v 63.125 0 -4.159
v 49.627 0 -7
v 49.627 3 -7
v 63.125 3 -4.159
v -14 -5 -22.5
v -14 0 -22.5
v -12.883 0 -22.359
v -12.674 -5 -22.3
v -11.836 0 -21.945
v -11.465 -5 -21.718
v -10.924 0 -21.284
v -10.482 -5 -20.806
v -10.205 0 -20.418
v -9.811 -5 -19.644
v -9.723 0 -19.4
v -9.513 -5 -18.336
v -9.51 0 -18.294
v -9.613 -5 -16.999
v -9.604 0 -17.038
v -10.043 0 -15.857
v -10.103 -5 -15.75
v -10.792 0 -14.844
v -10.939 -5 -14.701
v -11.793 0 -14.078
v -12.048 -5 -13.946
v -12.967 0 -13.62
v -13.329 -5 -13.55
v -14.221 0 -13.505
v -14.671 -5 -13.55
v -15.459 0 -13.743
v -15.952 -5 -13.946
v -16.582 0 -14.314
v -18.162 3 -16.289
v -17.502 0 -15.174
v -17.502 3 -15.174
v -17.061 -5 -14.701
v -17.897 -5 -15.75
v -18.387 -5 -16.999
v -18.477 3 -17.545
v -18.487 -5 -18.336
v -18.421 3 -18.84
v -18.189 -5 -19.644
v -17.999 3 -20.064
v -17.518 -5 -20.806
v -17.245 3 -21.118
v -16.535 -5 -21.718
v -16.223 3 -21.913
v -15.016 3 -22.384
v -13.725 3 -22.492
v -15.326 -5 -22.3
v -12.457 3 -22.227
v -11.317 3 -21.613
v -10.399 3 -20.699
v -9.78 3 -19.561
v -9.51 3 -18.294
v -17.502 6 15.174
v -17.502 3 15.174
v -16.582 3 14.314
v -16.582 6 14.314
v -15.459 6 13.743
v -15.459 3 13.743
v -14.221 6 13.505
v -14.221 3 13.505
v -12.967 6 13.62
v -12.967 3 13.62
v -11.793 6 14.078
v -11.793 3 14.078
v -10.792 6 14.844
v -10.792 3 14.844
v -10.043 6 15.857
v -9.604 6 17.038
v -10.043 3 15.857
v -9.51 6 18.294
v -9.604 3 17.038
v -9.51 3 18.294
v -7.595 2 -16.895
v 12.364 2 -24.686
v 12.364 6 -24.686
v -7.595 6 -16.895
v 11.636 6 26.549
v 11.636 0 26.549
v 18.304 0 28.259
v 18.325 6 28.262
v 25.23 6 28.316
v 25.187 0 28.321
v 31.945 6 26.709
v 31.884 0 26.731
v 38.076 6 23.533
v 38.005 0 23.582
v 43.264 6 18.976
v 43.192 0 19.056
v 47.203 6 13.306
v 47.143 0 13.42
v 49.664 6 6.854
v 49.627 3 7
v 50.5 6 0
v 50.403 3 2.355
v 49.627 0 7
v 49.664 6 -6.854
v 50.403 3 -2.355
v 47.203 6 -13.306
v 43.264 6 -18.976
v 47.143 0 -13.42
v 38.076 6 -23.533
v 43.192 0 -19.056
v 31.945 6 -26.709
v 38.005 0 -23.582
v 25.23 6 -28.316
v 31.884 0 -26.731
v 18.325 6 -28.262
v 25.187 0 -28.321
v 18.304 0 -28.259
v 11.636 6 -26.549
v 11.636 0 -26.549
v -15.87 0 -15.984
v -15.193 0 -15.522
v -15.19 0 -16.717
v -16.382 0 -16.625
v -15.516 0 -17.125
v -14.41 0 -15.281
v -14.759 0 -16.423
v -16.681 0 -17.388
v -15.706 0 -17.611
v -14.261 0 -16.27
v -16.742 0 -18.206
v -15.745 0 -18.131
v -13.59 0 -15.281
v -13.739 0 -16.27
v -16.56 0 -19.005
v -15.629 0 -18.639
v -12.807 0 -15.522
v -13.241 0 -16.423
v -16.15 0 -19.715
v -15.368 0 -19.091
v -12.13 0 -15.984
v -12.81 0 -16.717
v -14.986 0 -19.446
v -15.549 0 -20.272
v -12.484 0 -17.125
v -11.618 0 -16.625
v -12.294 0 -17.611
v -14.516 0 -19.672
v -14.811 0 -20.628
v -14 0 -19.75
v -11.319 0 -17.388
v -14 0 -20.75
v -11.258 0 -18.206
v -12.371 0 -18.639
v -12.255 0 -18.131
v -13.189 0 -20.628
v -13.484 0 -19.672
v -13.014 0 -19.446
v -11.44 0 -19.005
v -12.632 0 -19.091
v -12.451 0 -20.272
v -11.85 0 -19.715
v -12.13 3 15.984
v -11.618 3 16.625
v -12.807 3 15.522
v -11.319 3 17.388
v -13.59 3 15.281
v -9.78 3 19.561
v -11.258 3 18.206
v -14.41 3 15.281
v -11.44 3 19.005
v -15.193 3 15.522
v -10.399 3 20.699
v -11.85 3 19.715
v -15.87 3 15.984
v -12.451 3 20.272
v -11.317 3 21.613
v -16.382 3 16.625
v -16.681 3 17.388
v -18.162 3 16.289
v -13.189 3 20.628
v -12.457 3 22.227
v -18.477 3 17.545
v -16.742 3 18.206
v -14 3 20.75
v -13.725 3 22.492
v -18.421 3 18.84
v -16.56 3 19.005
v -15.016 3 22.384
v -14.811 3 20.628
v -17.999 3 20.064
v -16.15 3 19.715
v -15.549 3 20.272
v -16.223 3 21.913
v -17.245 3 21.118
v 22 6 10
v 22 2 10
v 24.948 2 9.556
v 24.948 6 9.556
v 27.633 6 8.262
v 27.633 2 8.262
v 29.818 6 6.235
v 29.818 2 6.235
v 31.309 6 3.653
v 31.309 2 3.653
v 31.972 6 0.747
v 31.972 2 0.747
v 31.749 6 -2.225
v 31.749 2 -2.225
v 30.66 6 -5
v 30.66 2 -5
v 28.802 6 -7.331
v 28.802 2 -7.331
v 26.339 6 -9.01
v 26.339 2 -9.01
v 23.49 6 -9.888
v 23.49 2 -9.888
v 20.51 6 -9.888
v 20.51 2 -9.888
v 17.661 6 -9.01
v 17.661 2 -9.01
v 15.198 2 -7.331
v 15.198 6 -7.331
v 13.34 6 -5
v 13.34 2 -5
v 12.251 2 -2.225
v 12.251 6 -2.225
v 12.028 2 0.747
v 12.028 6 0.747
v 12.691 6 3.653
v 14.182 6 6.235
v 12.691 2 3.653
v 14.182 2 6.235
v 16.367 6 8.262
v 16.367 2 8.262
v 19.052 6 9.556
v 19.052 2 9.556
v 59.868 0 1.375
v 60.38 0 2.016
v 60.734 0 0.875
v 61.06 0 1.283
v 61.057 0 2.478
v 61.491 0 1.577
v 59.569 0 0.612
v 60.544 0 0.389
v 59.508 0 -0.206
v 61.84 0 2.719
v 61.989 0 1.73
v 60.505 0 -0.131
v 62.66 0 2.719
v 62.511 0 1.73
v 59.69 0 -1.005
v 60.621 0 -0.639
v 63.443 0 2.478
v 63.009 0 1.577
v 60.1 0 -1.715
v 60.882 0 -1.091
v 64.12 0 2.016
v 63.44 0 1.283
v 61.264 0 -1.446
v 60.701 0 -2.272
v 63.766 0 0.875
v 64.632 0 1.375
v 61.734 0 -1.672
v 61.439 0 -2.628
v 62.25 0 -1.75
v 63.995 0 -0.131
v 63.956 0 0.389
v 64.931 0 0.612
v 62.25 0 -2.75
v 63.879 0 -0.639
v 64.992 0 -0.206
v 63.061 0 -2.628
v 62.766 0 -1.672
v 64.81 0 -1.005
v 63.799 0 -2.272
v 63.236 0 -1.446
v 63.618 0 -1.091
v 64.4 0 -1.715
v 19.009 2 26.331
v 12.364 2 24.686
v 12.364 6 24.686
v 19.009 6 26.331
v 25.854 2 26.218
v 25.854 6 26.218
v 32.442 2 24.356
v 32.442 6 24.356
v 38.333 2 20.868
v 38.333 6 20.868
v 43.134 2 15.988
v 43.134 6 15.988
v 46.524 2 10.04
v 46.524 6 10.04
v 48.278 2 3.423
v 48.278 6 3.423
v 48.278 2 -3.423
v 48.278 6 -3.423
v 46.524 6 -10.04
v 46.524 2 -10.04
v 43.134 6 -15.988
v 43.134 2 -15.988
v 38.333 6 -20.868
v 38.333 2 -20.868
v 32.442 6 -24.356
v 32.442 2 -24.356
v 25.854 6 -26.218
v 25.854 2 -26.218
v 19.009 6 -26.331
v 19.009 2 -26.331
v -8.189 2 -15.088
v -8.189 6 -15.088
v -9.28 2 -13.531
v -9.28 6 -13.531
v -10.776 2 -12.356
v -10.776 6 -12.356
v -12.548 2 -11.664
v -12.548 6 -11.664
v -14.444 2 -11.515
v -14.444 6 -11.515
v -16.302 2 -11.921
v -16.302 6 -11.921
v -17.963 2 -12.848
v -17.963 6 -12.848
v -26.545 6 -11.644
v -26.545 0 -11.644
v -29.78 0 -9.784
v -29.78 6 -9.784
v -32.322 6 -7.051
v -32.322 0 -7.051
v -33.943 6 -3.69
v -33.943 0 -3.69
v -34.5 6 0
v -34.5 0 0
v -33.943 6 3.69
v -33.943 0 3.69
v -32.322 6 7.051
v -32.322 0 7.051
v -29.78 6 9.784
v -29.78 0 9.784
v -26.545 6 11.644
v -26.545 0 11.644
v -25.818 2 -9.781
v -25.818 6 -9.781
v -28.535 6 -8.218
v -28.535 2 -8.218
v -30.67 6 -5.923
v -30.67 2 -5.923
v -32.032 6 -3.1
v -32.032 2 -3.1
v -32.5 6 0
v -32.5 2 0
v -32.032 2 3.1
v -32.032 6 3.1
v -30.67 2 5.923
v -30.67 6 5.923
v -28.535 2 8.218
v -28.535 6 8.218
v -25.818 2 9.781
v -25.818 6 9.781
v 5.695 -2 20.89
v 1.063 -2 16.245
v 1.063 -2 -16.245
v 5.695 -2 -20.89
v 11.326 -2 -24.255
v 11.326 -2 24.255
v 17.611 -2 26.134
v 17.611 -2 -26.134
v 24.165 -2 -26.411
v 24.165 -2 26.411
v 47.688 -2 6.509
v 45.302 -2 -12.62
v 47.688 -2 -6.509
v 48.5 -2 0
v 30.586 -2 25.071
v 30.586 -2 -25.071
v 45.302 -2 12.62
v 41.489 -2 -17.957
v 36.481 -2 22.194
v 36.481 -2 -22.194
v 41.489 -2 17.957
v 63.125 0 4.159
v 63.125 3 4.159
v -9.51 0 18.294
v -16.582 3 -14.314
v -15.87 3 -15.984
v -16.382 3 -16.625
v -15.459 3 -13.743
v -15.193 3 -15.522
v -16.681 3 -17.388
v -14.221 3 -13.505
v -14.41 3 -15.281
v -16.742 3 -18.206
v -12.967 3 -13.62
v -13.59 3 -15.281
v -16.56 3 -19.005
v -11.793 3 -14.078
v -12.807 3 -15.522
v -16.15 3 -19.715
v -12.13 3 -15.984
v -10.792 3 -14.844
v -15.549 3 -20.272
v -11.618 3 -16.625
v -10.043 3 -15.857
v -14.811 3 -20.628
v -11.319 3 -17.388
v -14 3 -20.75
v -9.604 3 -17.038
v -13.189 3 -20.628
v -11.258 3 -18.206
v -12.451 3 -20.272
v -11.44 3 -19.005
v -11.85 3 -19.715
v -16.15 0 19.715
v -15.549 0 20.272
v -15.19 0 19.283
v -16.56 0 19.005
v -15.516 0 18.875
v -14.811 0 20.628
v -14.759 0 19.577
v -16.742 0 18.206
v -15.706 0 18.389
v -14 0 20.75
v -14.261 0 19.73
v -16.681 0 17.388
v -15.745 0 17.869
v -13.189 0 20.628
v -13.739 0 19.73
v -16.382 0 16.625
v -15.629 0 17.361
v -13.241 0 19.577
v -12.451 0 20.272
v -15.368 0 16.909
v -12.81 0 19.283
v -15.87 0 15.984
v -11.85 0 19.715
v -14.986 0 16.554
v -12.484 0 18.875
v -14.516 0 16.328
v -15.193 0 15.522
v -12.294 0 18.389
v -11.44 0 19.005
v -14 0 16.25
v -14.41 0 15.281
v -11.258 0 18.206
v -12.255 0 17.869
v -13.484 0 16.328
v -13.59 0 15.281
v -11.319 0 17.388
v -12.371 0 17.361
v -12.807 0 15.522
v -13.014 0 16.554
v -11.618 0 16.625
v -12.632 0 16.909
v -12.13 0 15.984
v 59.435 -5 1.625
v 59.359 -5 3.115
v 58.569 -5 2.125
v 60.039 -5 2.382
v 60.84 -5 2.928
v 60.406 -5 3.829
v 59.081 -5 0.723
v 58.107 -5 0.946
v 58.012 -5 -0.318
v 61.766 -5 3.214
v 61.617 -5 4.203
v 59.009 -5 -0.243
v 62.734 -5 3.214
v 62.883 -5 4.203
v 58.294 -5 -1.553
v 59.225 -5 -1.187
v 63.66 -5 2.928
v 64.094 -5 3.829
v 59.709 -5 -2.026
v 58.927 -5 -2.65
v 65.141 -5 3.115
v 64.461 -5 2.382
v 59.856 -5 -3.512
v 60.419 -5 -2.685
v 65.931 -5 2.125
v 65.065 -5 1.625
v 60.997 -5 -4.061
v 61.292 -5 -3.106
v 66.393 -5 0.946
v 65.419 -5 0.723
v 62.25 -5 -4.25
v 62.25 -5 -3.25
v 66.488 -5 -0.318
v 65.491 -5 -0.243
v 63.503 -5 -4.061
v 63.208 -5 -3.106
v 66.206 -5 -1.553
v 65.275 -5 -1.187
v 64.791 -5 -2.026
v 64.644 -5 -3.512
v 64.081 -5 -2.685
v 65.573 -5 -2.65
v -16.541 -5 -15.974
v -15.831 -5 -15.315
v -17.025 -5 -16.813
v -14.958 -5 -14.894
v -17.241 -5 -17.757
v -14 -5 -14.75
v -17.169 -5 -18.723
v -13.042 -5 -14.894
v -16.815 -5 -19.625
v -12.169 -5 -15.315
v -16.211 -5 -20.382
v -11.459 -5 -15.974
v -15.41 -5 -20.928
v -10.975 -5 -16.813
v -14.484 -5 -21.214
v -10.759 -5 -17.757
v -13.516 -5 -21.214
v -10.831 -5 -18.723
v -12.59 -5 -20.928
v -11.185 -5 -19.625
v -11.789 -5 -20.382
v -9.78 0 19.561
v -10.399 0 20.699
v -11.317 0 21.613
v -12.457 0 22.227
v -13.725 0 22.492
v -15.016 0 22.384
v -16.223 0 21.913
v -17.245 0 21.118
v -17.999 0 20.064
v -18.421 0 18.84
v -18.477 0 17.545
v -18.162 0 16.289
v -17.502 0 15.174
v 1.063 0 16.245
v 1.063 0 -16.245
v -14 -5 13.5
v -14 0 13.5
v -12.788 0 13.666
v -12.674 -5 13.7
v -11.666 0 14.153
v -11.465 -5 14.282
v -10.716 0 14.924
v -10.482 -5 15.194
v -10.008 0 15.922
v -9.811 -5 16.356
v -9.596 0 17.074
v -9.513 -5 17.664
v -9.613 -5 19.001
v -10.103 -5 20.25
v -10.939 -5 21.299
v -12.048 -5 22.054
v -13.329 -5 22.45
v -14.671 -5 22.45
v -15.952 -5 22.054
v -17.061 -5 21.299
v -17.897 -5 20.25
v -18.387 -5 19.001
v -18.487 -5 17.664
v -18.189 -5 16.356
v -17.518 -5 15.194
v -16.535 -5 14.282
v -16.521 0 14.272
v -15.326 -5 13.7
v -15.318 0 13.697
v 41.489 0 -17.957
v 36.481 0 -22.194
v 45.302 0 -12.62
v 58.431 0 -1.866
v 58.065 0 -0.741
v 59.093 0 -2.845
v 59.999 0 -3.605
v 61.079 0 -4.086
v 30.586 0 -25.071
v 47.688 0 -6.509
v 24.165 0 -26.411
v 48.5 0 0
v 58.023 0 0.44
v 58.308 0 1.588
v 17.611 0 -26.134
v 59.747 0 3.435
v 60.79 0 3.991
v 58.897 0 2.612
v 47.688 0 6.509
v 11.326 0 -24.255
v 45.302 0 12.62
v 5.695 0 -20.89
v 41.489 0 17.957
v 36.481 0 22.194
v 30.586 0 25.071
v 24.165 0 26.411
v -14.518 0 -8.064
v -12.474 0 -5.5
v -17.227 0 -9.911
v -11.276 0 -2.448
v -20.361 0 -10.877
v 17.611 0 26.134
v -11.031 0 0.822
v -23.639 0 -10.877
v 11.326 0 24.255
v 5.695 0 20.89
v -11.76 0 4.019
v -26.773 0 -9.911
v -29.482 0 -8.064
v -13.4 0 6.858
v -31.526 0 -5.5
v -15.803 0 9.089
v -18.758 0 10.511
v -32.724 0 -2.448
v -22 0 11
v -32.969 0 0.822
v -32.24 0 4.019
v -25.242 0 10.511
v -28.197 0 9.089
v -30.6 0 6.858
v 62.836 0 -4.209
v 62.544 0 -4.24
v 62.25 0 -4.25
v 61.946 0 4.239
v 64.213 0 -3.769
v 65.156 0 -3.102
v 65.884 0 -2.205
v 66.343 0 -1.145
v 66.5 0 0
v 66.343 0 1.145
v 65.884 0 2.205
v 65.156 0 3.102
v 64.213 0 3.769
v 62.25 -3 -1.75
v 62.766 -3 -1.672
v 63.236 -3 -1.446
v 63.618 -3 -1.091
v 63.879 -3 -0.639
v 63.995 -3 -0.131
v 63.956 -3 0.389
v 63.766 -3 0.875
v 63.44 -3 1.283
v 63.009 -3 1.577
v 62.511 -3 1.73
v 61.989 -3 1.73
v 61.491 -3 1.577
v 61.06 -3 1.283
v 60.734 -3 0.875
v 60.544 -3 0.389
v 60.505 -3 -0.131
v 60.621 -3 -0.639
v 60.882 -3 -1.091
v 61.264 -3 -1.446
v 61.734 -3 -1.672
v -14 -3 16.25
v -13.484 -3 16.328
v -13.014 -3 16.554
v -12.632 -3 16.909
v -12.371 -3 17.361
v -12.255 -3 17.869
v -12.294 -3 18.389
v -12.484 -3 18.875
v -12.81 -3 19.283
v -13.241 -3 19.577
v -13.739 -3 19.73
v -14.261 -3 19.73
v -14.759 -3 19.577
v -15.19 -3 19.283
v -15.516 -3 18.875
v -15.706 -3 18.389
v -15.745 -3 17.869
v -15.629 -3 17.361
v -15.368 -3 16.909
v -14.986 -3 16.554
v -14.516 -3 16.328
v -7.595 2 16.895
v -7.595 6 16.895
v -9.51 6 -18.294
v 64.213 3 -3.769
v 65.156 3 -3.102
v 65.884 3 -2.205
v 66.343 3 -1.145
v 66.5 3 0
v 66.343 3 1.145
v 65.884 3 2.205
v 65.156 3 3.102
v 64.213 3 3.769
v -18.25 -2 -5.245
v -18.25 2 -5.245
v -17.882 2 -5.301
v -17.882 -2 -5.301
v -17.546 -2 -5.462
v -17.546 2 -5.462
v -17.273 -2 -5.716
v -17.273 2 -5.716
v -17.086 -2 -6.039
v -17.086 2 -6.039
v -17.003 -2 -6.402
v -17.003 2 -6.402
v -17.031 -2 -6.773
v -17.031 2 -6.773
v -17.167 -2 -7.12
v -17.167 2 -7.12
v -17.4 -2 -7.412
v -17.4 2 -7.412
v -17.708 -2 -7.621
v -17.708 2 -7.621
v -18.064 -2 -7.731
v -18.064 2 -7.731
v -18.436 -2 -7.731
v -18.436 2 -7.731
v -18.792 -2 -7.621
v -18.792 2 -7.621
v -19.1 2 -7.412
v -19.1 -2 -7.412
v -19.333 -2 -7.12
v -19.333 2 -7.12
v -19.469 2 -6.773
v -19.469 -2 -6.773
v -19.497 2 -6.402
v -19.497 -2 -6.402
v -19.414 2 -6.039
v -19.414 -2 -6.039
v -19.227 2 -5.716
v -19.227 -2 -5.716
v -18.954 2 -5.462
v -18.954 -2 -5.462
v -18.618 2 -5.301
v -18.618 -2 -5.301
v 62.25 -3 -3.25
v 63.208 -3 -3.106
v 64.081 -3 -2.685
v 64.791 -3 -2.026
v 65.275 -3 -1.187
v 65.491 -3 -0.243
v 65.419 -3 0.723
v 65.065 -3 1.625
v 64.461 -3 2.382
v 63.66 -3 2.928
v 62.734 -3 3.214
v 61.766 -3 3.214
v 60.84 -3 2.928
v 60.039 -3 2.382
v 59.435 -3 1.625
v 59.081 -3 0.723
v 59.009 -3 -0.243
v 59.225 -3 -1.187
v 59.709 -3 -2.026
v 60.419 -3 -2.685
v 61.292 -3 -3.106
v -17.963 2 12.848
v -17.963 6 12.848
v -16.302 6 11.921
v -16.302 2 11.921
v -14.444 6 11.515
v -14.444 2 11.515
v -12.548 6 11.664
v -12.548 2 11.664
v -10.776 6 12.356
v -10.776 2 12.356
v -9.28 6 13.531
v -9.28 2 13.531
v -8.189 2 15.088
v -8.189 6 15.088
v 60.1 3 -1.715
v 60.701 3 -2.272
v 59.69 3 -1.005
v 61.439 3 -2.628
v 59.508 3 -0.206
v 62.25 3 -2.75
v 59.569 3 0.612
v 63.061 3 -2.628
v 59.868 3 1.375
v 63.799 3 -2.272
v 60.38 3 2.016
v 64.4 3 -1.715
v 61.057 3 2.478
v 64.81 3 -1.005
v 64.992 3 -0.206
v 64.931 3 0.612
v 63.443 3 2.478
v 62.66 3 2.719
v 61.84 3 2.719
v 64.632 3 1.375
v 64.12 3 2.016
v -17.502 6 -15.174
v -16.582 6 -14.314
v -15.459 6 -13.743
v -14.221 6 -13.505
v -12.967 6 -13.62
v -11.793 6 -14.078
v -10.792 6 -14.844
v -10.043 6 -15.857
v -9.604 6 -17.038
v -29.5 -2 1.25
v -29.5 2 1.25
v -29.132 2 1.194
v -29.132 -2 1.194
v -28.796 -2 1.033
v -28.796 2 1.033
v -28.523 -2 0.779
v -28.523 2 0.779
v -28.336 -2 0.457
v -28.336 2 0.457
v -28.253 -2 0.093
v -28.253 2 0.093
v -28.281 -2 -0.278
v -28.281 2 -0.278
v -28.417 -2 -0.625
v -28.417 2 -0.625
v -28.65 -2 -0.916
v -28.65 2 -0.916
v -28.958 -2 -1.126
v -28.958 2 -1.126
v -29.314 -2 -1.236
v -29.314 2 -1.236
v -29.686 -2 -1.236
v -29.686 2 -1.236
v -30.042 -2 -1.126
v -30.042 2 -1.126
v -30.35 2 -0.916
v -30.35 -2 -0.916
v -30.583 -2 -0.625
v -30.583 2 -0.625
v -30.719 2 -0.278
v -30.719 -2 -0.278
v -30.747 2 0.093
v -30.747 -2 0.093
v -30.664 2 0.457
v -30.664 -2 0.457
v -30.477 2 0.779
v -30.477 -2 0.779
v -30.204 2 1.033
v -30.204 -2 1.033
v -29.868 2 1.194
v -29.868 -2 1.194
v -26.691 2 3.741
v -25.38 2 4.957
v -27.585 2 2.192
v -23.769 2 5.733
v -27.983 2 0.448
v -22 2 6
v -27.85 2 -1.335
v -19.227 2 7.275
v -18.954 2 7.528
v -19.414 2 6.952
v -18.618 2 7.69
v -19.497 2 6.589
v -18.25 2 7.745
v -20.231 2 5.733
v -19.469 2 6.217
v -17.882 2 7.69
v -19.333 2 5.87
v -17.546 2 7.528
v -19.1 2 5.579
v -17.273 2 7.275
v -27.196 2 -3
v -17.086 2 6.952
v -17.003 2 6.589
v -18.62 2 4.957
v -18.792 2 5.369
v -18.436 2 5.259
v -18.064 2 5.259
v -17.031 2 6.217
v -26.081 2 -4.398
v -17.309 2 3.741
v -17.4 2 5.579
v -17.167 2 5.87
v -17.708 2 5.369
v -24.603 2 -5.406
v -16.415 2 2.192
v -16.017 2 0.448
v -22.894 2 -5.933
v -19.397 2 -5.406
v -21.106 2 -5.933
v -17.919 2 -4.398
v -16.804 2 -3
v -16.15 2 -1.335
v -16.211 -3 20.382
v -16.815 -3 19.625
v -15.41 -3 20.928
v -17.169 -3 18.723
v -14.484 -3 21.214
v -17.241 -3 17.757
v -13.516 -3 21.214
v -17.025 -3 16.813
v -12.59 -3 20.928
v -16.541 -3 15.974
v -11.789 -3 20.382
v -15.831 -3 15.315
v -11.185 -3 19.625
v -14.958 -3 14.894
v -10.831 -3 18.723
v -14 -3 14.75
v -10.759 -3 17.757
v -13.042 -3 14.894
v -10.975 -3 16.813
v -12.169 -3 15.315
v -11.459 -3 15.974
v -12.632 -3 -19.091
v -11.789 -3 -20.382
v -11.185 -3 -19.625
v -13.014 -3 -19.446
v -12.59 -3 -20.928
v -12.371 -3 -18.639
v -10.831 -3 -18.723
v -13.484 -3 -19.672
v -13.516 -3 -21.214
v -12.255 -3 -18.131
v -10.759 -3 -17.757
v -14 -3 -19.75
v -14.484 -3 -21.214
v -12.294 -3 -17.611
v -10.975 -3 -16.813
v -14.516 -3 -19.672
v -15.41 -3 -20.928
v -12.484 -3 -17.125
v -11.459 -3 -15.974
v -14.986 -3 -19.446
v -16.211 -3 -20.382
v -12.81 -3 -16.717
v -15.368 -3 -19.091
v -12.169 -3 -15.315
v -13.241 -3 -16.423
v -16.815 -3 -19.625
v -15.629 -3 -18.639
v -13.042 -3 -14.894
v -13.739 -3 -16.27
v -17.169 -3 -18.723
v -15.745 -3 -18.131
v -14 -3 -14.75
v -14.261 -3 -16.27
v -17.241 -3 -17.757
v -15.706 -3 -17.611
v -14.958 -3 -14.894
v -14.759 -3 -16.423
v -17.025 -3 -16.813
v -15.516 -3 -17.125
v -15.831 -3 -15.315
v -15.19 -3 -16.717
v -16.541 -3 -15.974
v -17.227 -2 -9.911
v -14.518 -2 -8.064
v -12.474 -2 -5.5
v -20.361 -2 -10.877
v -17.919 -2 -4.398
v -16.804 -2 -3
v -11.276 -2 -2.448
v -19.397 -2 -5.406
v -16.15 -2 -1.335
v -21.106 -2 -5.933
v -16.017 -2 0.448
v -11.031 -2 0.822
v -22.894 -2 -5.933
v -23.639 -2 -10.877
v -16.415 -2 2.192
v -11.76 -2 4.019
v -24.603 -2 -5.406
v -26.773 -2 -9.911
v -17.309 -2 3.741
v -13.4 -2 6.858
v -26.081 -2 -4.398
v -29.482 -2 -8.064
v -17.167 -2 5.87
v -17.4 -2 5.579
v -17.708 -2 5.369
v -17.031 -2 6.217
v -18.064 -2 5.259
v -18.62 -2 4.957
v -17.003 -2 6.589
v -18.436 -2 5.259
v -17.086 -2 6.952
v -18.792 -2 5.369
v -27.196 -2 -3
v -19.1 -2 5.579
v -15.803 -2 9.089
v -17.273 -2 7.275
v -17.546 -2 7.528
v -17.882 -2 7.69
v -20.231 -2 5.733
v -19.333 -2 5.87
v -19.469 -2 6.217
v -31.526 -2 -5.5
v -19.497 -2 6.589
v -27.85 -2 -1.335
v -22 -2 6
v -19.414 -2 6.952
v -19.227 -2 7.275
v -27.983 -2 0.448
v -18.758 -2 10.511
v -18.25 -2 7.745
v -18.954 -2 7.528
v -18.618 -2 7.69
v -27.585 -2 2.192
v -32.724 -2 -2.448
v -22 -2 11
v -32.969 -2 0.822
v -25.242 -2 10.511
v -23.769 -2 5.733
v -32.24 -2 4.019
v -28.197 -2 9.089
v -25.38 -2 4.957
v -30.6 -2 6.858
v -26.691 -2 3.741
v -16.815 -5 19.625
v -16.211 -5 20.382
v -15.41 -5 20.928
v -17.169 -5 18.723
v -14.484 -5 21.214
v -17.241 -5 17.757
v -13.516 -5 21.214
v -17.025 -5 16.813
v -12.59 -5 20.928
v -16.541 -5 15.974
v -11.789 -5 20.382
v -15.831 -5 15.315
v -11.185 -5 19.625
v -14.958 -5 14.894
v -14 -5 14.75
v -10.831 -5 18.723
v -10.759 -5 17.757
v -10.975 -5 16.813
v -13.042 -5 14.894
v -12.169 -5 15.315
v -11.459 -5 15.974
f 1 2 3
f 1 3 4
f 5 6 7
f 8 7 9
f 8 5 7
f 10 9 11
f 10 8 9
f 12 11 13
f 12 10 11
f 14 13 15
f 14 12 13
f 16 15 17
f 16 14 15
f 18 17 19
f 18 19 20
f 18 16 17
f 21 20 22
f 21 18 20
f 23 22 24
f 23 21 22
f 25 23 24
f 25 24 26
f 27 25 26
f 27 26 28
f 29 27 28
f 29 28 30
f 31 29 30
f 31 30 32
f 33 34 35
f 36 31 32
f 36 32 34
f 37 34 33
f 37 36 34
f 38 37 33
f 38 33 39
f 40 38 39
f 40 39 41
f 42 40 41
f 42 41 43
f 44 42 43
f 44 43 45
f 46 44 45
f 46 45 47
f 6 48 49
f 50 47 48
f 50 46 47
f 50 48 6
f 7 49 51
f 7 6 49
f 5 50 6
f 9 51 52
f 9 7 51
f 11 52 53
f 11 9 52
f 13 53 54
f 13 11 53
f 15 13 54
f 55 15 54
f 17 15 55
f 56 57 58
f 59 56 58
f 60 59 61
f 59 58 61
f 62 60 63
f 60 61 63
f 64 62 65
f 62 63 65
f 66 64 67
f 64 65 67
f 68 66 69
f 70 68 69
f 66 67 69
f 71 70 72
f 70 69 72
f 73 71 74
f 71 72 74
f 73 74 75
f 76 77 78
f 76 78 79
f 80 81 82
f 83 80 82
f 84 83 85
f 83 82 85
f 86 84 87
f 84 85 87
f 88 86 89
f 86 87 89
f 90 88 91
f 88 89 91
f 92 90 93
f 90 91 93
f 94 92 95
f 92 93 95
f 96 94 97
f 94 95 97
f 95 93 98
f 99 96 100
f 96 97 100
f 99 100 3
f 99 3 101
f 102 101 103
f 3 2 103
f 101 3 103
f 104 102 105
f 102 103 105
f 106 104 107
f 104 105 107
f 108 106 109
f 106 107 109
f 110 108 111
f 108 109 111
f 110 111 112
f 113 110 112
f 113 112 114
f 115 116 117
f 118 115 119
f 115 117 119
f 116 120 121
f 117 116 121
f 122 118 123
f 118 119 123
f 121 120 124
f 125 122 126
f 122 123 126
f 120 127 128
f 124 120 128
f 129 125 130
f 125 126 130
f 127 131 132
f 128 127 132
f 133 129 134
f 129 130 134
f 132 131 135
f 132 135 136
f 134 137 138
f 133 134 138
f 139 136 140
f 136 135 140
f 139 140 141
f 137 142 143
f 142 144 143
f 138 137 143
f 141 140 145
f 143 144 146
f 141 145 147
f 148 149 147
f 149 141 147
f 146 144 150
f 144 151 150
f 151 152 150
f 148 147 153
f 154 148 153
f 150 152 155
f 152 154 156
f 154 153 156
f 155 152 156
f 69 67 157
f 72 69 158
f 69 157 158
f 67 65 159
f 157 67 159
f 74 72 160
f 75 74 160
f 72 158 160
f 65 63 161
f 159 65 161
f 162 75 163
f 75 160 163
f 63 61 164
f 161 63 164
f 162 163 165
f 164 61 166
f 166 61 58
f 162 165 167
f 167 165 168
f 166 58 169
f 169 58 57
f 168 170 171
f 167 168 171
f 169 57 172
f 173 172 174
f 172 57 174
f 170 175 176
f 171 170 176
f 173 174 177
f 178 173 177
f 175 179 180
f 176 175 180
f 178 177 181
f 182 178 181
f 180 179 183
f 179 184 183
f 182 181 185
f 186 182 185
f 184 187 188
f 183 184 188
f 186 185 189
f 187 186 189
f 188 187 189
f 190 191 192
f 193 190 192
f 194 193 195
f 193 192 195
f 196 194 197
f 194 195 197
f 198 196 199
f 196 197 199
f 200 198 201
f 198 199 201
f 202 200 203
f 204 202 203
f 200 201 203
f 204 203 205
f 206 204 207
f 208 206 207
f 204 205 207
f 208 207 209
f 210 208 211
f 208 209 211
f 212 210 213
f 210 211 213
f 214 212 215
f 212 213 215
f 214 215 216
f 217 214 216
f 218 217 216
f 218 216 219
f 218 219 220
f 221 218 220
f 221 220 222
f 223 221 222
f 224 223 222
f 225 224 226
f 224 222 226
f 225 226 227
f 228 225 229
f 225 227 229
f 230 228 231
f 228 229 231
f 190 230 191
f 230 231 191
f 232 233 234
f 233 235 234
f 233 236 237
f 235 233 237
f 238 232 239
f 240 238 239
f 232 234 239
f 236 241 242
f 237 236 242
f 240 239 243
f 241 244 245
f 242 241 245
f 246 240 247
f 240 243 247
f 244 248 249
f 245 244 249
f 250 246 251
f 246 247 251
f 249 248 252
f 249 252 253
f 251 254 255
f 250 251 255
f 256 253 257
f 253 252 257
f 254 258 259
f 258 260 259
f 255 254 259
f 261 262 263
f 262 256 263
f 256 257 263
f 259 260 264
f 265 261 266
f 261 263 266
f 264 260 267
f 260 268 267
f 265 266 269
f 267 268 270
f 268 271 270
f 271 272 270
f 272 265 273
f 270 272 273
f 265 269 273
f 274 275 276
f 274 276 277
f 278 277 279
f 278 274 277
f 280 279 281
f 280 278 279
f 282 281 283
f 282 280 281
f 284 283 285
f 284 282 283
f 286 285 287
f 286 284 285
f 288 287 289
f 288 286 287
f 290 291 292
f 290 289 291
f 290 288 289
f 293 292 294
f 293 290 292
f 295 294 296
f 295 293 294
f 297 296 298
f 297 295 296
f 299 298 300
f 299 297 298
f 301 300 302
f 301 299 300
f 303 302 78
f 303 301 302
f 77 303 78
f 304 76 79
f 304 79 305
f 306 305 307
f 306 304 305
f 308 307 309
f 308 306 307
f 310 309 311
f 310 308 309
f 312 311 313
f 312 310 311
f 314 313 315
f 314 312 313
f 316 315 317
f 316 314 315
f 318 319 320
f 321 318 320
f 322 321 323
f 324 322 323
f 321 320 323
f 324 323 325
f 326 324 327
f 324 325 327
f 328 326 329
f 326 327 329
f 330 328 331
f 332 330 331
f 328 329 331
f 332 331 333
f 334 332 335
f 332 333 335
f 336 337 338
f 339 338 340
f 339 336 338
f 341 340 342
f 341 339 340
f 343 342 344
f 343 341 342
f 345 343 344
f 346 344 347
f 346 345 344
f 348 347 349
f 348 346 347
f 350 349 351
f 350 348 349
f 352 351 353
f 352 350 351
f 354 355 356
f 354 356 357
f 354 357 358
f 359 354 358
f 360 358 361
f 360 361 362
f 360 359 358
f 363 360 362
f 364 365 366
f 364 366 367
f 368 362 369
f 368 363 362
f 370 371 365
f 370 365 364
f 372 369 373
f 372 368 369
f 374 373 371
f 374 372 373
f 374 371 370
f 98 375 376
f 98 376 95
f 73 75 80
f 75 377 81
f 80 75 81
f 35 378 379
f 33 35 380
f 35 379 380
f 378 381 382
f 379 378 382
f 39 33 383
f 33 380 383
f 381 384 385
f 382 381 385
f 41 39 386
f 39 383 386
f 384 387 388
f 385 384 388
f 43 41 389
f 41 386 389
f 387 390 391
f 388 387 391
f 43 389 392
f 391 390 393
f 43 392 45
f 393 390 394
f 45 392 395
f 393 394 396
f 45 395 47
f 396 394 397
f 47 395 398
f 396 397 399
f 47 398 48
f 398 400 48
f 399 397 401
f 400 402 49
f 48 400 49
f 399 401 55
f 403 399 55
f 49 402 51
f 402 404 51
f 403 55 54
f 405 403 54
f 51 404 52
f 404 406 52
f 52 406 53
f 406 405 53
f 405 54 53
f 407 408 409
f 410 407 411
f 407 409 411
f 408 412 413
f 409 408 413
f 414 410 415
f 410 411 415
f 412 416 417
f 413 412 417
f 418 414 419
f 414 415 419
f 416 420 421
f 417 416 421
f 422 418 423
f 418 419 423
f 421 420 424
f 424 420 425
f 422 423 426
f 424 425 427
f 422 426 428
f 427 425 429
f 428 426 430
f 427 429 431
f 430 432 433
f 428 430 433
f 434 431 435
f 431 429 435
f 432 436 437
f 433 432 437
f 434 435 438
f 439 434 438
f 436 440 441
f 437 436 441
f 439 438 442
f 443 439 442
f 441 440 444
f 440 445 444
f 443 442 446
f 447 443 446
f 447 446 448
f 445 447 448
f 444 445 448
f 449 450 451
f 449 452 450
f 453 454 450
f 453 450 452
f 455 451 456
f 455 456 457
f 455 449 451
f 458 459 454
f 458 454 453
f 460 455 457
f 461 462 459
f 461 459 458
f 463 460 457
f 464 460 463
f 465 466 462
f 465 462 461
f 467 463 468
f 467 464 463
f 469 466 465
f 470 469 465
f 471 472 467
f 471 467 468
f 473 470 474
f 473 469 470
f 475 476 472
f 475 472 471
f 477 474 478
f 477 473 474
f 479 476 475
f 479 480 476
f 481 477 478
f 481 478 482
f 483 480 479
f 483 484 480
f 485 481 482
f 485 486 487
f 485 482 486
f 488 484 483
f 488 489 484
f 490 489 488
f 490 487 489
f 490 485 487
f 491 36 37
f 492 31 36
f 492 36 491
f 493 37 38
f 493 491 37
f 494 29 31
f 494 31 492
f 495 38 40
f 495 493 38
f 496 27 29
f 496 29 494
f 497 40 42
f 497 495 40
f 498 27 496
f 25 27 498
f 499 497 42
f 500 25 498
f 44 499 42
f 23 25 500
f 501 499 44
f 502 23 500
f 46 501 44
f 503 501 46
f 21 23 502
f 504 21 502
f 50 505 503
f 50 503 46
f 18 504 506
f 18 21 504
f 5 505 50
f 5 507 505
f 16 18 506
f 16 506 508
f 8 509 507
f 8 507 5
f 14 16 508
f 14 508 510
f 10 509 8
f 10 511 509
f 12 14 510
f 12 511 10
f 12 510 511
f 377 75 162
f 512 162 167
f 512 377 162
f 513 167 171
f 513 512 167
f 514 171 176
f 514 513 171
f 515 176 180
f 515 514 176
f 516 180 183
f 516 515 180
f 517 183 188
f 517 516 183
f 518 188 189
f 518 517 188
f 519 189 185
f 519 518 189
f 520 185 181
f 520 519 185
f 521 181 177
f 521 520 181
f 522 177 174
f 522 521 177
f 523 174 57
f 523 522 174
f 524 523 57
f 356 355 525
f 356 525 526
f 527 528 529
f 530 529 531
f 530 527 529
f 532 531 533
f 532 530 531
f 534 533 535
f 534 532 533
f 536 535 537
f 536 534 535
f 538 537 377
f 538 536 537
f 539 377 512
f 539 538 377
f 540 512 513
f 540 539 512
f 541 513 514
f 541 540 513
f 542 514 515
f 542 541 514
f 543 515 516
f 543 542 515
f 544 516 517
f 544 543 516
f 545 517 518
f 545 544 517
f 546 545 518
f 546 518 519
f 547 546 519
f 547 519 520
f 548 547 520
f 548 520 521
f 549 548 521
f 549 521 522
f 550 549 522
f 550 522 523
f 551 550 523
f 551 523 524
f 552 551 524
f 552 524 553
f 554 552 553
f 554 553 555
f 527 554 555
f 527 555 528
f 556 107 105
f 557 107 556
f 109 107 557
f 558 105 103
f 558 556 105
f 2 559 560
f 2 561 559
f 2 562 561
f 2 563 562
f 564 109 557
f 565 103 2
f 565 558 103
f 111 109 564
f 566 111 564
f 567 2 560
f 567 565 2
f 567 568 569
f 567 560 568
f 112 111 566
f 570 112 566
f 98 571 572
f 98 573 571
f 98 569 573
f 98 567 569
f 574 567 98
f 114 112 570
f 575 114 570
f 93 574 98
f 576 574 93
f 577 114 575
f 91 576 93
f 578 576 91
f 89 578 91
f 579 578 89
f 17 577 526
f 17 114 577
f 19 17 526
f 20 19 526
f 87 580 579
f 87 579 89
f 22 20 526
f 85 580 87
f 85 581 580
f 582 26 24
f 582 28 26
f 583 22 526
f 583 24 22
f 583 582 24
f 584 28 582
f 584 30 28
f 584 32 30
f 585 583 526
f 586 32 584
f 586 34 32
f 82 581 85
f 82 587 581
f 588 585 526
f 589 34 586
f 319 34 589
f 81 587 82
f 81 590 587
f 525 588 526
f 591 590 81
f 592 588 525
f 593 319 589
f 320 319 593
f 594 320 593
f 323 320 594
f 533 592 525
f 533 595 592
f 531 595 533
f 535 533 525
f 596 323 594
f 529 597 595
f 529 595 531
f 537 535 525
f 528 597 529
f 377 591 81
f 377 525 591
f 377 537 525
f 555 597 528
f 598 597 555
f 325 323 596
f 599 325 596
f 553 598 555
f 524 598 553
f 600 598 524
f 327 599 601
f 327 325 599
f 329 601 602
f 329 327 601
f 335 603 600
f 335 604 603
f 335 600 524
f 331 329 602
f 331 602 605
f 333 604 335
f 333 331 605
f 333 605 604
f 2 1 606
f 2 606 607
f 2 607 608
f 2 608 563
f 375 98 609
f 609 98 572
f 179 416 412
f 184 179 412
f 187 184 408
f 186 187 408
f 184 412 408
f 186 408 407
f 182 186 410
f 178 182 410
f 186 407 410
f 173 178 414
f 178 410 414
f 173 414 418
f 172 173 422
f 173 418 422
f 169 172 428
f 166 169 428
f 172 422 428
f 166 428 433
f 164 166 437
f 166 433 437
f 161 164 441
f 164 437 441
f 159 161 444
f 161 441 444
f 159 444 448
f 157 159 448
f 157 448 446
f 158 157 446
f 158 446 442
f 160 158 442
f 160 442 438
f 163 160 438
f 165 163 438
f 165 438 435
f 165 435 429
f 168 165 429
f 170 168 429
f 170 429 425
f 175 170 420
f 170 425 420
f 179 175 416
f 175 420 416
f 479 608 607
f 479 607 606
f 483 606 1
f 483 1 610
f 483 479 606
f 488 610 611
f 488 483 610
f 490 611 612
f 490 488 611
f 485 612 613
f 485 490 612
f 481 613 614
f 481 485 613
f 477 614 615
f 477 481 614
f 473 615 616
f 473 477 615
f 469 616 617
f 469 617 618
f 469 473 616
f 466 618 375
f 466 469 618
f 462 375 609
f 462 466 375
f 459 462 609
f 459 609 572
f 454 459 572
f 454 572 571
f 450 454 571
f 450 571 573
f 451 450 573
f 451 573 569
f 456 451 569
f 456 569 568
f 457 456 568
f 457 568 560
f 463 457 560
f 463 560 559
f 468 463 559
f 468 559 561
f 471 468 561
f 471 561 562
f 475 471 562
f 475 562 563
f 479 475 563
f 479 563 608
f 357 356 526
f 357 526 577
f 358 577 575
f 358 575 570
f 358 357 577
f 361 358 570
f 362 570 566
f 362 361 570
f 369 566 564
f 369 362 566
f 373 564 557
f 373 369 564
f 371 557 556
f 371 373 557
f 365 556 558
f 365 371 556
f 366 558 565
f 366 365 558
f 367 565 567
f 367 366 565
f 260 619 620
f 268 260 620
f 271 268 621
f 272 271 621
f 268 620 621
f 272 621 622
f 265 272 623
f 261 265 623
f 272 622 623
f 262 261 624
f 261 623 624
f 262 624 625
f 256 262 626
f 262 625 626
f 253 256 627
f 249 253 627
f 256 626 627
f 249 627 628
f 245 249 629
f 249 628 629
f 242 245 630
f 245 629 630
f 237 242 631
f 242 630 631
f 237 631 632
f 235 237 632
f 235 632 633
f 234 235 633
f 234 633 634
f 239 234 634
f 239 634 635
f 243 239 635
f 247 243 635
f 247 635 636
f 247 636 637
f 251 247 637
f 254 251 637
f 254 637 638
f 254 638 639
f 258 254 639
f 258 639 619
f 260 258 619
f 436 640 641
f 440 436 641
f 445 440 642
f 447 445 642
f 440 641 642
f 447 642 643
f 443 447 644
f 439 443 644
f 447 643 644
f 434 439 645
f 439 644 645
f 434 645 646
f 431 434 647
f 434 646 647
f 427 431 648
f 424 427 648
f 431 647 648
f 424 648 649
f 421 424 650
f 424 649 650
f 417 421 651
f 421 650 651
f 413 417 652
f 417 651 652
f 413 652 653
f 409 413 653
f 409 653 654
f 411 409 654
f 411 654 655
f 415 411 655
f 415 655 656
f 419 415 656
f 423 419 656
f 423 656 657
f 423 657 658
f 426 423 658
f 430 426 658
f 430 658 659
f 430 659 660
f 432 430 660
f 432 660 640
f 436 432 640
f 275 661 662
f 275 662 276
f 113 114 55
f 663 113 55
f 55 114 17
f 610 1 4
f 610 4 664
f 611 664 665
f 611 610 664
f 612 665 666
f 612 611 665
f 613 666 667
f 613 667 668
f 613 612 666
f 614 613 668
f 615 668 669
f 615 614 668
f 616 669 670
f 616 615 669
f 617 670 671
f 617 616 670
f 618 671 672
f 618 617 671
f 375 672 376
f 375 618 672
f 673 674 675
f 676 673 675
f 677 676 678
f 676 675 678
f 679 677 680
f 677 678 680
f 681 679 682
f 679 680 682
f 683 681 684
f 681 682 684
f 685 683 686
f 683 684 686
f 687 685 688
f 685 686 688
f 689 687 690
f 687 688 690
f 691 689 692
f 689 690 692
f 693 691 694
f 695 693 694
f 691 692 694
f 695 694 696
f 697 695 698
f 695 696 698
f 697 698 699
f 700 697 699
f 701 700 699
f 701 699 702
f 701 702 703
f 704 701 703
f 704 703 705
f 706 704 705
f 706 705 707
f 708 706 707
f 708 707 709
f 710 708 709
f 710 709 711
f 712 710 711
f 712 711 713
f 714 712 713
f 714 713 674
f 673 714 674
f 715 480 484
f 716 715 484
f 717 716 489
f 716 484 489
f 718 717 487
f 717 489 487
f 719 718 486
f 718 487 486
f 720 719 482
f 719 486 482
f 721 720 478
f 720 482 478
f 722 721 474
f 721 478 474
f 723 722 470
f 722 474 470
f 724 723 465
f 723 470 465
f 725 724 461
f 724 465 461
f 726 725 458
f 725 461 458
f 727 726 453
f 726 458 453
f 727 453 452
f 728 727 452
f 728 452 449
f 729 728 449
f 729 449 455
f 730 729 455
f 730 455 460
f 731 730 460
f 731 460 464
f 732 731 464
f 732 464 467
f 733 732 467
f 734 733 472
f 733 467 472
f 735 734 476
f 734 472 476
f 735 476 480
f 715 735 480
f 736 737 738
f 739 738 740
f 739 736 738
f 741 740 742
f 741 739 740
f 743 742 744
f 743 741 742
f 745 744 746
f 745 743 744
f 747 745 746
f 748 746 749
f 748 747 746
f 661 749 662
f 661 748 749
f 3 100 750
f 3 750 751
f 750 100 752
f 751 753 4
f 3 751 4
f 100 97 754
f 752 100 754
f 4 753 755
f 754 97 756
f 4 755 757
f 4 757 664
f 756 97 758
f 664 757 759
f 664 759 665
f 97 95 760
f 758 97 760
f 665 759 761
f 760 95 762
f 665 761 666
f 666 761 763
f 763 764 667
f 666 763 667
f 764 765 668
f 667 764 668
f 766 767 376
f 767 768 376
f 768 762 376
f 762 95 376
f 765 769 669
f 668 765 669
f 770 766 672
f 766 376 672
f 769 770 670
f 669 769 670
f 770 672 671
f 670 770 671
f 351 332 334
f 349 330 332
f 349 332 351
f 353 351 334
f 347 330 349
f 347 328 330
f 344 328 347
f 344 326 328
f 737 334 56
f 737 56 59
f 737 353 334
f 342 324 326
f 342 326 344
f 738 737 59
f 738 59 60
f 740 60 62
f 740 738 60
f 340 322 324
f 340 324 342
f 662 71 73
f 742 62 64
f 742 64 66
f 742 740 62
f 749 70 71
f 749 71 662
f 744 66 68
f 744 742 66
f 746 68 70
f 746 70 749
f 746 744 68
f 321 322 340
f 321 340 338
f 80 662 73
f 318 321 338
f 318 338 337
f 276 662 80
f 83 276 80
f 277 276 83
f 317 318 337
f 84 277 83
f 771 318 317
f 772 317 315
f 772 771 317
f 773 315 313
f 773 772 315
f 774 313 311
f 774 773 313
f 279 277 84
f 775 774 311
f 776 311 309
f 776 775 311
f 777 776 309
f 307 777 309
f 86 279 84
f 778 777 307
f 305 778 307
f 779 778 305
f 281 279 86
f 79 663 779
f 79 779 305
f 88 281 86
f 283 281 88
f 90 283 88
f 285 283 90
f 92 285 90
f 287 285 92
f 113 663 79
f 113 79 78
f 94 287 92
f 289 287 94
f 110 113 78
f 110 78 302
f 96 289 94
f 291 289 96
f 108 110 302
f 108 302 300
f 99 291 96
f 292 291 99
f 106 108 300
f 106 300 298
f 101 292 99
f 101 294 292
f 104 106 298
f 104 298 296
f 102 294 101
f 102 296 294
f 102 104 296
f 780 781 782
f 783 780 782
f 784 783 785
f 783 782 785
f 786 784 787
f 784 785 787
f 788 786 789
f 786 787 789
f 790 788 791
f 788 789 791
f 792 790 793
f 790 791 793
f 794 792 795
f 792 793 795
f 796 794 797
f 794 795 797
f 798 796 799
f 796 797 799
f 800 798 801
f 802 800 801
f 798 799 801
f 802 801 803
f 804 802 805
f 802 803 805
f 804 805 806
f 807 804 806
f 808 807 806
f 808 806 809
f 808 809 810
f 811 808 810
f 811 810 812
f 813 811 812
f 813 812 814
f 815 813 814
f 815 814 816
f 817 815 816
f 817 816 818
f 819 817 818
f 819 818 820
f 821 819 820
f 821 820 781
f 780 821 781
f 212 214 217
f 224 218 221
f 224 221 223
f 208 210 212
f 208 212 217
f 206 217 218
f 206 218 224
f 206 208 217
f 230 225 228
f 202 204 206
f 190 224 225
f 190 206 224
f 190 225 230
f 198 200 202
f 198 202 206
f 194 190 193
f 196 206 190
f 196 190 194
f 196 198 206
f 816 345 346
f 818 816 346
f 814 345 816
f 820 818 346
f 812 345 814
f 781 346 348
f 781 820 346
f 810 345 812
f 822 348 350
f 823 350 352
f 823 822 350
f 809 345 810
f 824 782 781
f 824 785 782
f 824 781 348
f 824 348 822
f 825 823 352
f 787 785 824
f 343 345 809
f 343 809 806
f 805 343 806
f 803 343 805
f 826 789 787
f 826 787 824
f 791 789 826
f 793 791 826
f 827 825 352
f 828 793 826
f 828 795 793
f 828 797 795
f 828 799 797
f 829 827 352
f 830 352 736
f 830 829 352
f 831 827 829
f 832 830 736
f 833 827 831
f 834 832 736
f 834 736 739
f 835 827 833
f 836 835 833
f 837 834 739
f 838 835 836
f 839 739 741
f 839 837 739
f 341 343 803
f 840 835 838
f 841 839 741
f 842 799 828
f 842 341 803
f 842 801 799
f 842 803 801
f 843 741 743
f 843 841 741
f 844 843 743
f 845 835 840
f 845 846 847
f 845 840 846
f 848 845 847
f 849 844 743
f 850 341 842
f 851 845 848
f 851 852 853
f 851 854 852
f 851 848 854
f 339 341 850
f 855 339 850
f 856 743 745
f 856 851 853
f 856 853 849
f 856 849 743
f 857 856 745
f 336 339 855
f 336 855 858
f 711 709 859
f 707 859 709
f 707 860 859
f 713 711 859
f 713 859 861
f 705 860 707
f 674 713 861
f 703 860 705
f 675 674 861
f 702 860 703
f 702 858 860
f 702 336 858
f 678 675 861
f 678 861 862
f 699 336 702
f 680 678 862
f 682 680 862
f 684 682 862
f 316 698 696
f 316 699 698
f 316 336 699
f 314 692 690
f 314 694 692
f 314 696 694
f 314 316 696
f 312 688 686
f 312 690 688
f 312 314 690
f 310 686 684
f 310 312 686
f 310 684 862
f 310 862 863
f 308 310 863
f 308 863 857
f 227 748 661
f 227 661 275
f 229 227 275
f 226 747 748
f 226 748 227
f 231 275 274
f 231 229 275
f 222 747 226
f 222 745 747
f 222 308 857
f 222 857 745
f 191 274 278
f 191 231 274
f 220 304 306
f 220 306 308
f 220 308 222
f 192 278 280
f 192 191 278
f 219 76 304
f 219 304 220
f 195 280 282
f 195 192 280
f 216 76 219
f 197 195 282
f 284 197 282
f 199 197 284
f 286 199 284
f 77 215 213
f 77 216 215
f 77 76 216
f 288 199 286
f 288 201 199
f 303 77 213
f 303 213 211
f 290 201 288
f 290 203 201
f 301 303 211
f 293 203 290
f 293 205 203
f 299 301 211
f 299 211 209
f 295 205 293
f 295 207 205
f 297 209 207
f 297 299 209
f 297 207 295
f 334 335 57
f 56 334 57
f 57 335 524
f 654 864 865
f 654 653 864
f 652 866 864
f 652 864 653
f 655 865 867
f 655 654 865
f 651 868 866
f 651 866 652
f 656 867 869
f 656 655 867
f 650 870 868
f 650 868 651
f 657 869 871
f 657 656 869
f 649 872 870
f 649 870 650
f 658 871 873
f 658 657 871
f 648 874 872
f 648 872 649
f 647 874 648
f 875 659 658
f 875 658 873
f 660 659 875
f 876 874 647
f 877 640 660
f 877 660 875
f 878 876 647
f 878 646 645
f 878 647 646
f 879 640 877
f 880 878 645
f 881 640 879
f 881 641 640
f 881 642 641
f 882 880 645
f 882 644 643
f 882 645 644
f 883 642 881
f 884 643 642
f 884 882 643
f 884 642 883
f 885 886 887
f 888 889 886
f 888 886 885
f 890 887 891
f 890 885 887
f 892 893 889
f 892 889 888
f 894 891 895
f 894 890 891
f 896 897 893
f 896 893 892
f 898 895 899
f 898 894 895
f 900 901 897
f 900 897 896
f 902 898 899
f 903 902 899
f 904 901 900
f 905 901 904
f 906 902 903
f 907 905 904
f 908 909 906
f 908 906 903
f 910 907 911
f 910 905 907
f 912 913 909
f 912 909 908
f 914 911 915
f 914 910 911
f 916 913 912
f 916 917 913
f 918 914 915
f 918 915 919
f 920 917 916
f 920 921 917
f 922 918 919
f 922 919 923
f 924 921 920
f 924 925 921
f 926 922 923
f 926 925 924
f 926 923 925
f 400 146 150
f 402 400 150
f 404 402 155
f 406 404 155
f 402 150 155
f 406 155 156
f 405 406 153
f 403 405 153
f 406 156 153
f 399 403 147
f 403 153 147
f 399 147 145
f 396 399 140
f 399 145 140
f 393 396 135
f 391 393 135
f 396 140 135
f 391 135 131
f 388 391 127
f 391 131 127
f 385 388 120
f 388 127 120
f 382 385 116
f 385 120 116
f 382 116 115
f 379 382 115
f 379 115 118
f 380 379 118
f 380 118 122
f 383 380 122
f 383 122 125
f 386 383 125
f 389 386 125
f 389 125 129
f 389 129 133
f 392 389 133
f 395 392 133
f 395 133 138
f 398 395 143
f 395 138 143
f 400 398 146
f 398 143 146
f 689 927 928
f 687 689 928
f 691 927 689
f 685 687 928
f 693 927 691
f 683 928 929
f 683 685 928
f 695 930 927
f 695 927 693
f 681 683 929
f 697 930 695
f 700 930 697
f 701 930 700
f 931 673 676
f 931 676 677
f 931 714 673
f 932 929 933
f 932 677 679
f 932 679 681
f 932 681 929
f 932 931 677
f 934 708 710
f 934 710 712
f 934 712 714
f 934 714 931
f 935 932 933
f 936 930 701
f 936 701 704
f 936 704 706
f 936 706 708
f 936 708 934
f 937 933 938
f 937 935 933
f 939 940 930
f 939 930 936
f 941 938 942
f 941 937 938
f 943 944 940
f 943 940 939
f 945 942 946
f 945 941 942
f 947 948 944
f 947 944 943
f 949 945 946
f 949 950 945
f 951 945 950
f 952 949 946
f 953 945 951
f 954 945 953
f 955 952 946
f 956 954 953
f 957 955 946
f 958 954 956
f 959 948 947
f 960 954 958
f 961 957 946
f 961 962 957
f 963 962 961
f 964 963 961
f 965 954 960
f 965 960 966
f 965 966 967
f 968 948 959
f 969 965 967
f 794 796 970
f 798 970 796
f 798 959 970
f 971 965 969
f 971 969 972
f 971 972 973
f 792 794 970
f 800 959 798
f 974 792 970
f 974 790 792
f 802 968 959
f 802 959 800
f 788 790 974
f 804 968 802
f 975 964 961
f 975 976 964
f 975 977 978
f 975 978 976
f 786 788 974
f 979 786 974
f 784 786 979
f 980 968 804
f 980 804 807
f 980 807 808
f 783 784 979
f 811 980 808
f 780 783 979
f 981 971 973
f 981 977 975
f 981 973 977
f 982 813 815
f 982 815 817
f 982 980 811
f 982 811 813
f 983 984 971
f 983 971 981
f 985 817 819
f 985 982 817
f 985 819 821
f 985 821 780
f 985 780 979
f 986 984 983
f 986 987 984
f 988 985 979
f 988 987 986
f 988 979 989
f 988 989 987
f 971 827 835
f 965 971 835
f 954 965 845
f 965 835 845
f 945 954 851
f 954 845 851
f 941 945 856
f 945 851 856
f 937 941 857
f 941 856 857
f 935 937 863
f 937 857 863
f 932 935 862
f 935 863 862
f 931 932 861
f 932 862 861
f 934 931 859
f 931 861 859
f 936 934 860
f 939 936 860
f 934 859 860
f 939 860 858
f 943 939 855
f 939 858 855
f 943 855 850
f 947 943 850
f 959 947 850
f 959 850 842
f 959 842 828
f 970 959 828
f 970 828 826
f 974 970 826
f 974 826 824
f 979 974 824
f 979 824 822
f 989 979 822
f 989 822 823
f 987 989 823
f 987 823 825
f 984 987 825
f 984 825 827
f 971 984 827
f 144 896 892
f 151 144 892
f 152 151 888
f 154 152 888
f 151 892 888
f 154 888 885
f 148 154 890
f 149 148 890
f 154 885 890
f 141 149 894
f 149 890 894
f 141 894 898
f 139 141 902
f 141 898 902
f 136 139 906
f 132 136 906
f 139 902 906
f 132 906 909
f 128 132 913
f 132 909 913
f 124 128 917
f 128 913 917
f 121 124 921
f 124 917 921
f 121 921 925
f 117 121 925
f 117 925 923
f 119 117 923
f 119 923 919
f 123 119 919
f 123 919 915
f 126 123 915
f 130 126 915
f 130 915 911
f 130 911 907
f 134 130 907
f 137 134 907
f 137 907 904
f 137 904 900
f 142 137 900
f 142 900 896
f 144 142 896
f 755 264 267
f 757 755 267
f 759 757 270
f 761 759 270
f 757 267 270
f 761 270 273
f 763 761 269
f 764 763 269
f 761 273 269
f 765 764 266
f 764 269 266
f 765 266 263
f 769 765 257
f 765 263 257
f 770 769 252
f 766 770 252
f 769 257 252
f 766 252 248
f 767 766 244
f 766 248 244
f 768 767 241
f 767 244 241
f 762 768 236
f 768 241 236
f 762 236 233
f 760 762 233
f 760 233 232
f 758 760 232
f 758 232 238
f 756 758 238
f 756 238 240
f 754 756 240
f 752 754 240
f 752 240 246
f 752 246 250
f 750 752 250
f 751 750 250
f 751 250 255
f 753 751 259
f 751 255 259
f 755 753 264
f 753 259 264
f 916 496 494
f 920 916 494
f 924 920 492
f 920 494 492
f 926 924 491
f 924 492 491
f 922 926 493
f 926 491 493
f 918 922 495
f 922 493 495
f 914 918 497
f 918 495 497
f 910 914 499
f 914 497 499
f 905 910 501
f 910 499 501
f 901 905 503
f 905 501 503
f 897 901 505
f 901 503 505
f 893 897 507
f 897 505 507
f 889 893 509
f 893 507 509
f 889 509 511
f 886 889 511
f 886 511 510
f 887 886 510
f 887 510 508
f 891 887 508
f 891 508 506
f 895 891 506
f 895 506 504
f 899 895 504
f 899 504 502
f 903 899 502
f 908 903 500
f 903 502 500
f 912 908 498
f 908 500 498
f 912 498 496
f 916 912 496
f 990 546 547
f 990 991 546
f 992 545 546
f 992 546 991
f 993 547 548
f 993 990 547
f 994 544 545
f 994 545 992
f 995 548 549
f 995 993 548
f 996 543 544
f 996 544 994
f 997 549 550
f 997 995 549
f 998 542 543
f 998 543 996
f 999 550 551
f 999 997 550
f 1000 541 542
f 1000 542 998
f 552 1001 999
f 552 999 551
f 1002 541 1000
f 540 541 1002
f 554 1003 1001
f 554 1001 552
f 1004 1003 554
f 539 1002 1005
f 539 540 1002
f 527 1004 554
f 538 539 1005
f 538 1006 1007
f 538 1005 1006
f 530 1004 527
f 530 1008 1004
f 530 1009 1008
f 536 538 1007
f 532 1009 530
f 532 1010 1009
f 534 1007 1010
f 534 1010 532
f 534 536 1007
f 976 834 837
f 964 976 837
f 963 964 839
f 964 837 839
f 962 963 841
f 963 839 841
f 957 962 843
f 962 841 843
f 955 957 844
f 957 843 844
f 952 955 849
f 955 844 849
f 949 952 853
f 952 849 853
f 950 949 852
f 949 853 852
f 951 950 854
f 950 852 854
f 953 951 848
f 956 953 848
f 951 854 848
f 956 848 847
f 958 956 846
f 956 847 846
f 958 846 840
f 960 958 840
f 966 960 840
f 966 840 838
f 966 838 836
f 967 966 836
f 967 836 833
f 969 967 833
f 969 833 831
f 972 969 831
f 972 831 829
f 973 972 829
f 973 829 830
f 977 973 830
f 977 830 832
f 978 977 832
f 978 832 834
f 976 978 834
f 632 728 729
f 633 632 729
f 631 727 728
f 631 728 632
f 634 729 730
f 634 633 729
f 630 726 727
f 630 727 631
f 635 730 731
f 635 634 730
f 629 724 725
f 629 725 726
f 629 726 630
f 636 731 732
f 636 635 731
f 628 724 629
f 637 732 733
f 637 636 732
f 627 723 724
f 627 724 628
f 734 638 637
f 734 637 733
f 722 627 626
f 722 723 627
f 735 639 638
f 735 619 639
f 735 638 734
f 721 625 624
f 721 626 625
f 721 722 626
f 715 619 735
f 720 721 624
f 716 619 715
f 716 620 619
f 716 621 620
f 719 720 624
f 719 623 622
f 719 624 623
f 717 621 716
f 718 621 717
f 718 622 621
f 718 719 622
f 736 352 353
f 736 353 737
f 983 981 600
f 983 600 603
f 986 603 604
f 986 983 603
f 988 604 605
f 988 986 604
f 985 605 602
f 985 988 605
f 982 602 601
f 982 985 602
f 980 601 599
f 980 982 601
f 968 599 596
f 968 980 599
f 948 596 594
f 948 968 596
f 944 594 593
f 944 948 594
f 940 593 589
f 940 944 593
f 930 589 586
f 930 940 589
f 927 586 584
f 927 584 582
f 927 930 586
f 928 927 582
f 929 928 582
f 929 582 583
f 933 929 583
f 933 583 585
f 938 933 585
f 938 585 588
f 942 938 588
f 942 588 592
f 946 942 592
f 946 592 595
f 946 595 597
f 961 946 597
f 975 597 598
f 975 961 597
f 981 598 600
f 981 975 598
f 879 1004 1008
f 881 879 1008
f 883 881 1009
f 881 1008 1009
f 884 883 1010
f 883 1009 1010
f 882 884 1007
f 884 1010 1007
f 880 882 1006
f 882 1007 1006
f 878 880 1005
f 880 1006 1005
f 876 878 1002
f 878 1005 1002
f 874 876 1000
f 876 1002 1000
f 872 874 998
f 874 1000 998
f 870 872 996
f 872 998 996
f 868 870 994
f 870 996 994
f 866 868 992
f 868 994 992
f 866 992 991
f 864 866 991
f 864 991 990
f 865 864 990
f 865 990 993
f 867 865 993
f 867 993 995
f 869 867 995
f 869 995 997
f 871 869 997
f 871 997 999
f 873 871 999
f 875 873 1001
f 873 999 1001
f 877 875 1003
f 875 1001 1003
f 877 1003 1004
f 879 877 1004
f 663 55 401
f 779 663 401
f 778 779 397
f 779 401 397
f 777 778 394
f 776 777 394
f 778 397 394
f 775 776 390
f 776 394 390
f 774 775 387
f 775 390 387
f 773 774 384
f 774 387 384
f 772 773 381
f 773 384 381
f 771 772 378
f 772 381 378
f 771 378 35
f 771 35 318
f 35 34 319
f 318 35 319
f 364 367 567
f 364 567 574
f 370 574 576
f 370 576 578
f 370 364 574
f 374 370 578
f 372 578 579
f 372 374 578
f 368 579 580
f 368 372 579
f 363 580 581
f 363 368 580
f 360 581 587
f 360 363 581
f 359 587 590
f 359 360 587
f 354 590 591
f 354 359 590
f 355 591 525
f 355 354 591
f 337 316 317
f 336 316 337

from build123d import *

# Parameters (mm, degrees)
BOSS_EXTRUDE1_DEPTH   = 6
SHELL1_T              = -2
SKETCH2_R             = 2.75
BOSS_EXTRUDE2_DEPTH   = 3
SKETCH2_R_2           = 4.5
BOSS_EXTRUDE2_2_DEPTH = 3
BOSS_EXTRUDE2_3_DEPTH = 3
BOSS_EXTRUDE3_START   = 5
SKETCH3_R             = 4.5
SKETCH3_R_2           = 4.25
BOSS_EXTRUDE3_DEPTH   = 5
SKETCH4_R             = 3.25
CUT_EXTRUDE1_DEPTH    = 2
SKETCH5_R             = 1.75
CUT_EXTRUDE2_DEPTH    = 73.907475611
BOSS_EXTRUDE5_START   = 2
SKETCH7_R             = 11
BOSS_EXTRUDE5_DEPTH   = 2
SKETCH6_R             = 1.25
SKETCH6_R_2           = 6
CUT_EXTRUDE4_DEPTH    = 73.687688091
SKETCH9_R             = 10
BOSS_EXTRUDE6_DEPTH   = 4


with BuildPart() as part:
    # Sketch1 → Boss-Extrude1 (new body)
    with BuildSketch(Plane(origin=(0, 0, 0), x_dir=(1, 0, 0), z_dir=(0, 1, 0))):
        with BuildLine():
            Line((-17.502255184, 15.174365801), (-26.545454545, 11.644262234))
            ThreePointArc((-26.545454545, 11.644262234), (-34.5, 0), (-26.545454545, -11.644262234))
            Line((-26.545454545, -11.644262234), (-17.502255184, -15.174365801))
            ThreePointArc((-17.502255184, -15.174365801), (-12.363636364, -13.808065596), (-9.50963812, -18.294364031))
            Line((-9.50963812, -18.294364031), (11.636363636, -26.548917894))
            ThreePointArc((11.636363636, -26.548917894), (50.5, 0), (11.636363636, 26.548917894))
            Line((11.636363636, 26.548917894), (-9.50963812, 18.294364031))
            ThreePointArc((-9.50963812, 18.294364031), (-12.363636364, 13.808065596), (-17.502255184, 15.174365801))
        make_face()
    extrude(amount=BOSS_EXTRUDE1_DEPTH)

    # Shell1
    shell1_openings = [part.faces().sort_by_distance(p)[0] for p in [
        (12.478104295, 6, 0),
    ]]
    offset(amount=SHELL1_T, openings=shell1_openings, kind=Kind.INTERSECTION)



with BuildPart() as body_2:
    # Sketch2 → Boss-Extrude2 (new body)
    with BuildSketch(Plane.XZ):
        with BuildLine():
            Line((49.626979567, -7), (63.125355805, -4.158876316))
            ThreePointArc((63.125355805, -4.158876316), (66.5, 0), (63.125355805, 4.158876316))
            Line((63.125355805, 4.158876316), (49.626979567, 7))
            ThreePointArc((49.626979567, 7), (50.5, 0), (49.626979567, -7))
        make_face()
        with Locations(Location((62.25, 0, 0), (0, 0, 270))):
            Circle(SKETCH2_R, mode=Mode.SUBTRACT)
    extrude(amount=-BOSS_EXTRUDE2_DEPTH)


with BuildPart() as body_3:
    # Sketch2 → Boss-Extrude2 2 (new body)
    with BuildSketch(Plane.XZ):
        with Locations(Location((-14, -18, 0), (0, 0, 270))):
            Circle(SKETCH2_R_2)
        with Locations(Location((-14, -18, 0), (0, 0, 270))):
            Circle(SKETCH2_R, mode=Mode.SUBTRACT)
    extrude(amount=-BOSS_EXTRUDE2_2_DEPTH)


with BuildPart() as body_4:
    # Sketch2 → Boss-Extrude2 3 (new body)
    with BuildSketch(Plane.XZ):
        with Locations(Location((-14, 18, 0), (0, 0, 90))):
            Circle(SKETCH2_R_2)
        with Locations(Location((-14, 18, 0), (0, 0, 90))):
            Circle(SKETCH2_R, mode=Mode.SUBTRACT)
    extrude(amount=-BOSS_EXTRUDE2_3_DEPTH)


with BuildPart() as part_1:
    add(part.part)

    add(body_2.part)  # Boss-Extrude3 merges body 2

    add(body_3.part)  # Boss-Extrude3 merges body 3

    add(body_4.part)  # Boss-Extrude3 merges body 4
    # Sketch3 → Boss-Extrude3 (add)
    with BuildSketch(Plane.XZ.offset(BOSS_EXTRUDE3_START)):
        with Locations(Location((-14, 18, 0), (0, 0, 270))):
            Circle(SKETCH3_R)
        with Locations(Location((62.25, 0, 0), (0, 0, 270))):
            Circle(SKETCH3_R_2)
        with Locations(Location((-14, -18, 0), (0, 0, 270))):
            Circle(SKETCH3_R)
    extrude(amount=-BOSS_EXTRUDE3_DEPTH)

    # Sketch4 → Cut-Extrude1 (cut)
    with BuildSketch(Plane.XZ.offset(5)):
        with Locations(Location((-14, 18, 0), (0, 0, 270))):
            Circle(SKETCH4_R)
        with Locations(Location((-14, -18, 0), (0, 0, 90))):
            Circle(SKETCH4_R)
        with Locations(Location((62.25, 0, 0), (0, 0, 270))):
            Circle(SKETCH4_R)
    extrude(amount=-CUT_EXTRUDE1_DEPTH, mode=Mode.SUBTRACT)

    # Sketch5 → Cut-Extrude2 (cut, through all)
    with BuildSketch(Plane.XZ.offset(3)):
        with Locations(Location((-14, 18, 0), (0, 0, 270))):
            Circle(SKETCH5_R)
        with Locations(Location((-14, -18, 0), (0, 0, 270))):
            Circle(SKETCH5_R)
        with Locations(Location((62.25, 0, 0), (0, 0, 270))):
            Circle(SKETCH5_R)
    extrude(amount=-CUT_EXTRUDE2_DEPTH, mode=Mode.SUBTRACT)

    # Sketch7 → Boss-Extrude5 (add)
    with BuildSketch(Plane.XZ.offset(BOSS_EXTRUDE5_START)):
        with Locations(Location((-22, 0, 0), (0, 0, 90))):
            Circle(SKETCH7_R)
        with BuildLine():
            ThreePointArc((48.5, 0), (30.585718173, 25.070609156), (1.063362758, 16.245221482))
            Line((1.063362758, 16.245221482), (1.063362758, -16.245221482))
            ThreePointArc((1.063362758, -16.245221482), (30.585718173, -25.070609156), (48.5, 0))
        make_face()
    extrude(amount=-BOSS_EXTRUDE5_DEPTH)

    # Sketch6 → Cut-Extrude4 (cut, through all)
    with BuildSketch(Plane(origin=(0, 2, 0), x_dir=(1, 0, 0), z_dir=(0, 1, 0))):
        with Locations(Location((-29.5, 0, 0), (0, 0, 270))):
            Circle(SKETCH6_R)
        with Locations(Location((-18.25, 6.495190528, 0), (0, 0, 270))):
            Circle(SKETCH6_R)
        with Locations(Location((-18.25, -6.495190528, 0), (0, 0, 270))):
            Circle(SKETCH6_R)
        with Locations(Location((-22, 0, 0), (0, 0, 270))):
            Circle(SKETCH6_R_2)
    extrude(amount=-CUT_EXTRUDE4_DEPTH, mode=Mode.SUBTRACT)

    # Sketch9 → Boss-Extrude6 (add)
    with BuildSketch(Plane(origin=(0, 2, 0), x_dir=(1, 0, 0), z_dir=(0, 1, 0))):
        with Locations(Location((22, 0, 0), (0, 0, 270))):
            Circle(SKETCH9_R)
    extrude(amount=BOSS_EXTRUDE6_DEPTH)


solid = part_1.part
